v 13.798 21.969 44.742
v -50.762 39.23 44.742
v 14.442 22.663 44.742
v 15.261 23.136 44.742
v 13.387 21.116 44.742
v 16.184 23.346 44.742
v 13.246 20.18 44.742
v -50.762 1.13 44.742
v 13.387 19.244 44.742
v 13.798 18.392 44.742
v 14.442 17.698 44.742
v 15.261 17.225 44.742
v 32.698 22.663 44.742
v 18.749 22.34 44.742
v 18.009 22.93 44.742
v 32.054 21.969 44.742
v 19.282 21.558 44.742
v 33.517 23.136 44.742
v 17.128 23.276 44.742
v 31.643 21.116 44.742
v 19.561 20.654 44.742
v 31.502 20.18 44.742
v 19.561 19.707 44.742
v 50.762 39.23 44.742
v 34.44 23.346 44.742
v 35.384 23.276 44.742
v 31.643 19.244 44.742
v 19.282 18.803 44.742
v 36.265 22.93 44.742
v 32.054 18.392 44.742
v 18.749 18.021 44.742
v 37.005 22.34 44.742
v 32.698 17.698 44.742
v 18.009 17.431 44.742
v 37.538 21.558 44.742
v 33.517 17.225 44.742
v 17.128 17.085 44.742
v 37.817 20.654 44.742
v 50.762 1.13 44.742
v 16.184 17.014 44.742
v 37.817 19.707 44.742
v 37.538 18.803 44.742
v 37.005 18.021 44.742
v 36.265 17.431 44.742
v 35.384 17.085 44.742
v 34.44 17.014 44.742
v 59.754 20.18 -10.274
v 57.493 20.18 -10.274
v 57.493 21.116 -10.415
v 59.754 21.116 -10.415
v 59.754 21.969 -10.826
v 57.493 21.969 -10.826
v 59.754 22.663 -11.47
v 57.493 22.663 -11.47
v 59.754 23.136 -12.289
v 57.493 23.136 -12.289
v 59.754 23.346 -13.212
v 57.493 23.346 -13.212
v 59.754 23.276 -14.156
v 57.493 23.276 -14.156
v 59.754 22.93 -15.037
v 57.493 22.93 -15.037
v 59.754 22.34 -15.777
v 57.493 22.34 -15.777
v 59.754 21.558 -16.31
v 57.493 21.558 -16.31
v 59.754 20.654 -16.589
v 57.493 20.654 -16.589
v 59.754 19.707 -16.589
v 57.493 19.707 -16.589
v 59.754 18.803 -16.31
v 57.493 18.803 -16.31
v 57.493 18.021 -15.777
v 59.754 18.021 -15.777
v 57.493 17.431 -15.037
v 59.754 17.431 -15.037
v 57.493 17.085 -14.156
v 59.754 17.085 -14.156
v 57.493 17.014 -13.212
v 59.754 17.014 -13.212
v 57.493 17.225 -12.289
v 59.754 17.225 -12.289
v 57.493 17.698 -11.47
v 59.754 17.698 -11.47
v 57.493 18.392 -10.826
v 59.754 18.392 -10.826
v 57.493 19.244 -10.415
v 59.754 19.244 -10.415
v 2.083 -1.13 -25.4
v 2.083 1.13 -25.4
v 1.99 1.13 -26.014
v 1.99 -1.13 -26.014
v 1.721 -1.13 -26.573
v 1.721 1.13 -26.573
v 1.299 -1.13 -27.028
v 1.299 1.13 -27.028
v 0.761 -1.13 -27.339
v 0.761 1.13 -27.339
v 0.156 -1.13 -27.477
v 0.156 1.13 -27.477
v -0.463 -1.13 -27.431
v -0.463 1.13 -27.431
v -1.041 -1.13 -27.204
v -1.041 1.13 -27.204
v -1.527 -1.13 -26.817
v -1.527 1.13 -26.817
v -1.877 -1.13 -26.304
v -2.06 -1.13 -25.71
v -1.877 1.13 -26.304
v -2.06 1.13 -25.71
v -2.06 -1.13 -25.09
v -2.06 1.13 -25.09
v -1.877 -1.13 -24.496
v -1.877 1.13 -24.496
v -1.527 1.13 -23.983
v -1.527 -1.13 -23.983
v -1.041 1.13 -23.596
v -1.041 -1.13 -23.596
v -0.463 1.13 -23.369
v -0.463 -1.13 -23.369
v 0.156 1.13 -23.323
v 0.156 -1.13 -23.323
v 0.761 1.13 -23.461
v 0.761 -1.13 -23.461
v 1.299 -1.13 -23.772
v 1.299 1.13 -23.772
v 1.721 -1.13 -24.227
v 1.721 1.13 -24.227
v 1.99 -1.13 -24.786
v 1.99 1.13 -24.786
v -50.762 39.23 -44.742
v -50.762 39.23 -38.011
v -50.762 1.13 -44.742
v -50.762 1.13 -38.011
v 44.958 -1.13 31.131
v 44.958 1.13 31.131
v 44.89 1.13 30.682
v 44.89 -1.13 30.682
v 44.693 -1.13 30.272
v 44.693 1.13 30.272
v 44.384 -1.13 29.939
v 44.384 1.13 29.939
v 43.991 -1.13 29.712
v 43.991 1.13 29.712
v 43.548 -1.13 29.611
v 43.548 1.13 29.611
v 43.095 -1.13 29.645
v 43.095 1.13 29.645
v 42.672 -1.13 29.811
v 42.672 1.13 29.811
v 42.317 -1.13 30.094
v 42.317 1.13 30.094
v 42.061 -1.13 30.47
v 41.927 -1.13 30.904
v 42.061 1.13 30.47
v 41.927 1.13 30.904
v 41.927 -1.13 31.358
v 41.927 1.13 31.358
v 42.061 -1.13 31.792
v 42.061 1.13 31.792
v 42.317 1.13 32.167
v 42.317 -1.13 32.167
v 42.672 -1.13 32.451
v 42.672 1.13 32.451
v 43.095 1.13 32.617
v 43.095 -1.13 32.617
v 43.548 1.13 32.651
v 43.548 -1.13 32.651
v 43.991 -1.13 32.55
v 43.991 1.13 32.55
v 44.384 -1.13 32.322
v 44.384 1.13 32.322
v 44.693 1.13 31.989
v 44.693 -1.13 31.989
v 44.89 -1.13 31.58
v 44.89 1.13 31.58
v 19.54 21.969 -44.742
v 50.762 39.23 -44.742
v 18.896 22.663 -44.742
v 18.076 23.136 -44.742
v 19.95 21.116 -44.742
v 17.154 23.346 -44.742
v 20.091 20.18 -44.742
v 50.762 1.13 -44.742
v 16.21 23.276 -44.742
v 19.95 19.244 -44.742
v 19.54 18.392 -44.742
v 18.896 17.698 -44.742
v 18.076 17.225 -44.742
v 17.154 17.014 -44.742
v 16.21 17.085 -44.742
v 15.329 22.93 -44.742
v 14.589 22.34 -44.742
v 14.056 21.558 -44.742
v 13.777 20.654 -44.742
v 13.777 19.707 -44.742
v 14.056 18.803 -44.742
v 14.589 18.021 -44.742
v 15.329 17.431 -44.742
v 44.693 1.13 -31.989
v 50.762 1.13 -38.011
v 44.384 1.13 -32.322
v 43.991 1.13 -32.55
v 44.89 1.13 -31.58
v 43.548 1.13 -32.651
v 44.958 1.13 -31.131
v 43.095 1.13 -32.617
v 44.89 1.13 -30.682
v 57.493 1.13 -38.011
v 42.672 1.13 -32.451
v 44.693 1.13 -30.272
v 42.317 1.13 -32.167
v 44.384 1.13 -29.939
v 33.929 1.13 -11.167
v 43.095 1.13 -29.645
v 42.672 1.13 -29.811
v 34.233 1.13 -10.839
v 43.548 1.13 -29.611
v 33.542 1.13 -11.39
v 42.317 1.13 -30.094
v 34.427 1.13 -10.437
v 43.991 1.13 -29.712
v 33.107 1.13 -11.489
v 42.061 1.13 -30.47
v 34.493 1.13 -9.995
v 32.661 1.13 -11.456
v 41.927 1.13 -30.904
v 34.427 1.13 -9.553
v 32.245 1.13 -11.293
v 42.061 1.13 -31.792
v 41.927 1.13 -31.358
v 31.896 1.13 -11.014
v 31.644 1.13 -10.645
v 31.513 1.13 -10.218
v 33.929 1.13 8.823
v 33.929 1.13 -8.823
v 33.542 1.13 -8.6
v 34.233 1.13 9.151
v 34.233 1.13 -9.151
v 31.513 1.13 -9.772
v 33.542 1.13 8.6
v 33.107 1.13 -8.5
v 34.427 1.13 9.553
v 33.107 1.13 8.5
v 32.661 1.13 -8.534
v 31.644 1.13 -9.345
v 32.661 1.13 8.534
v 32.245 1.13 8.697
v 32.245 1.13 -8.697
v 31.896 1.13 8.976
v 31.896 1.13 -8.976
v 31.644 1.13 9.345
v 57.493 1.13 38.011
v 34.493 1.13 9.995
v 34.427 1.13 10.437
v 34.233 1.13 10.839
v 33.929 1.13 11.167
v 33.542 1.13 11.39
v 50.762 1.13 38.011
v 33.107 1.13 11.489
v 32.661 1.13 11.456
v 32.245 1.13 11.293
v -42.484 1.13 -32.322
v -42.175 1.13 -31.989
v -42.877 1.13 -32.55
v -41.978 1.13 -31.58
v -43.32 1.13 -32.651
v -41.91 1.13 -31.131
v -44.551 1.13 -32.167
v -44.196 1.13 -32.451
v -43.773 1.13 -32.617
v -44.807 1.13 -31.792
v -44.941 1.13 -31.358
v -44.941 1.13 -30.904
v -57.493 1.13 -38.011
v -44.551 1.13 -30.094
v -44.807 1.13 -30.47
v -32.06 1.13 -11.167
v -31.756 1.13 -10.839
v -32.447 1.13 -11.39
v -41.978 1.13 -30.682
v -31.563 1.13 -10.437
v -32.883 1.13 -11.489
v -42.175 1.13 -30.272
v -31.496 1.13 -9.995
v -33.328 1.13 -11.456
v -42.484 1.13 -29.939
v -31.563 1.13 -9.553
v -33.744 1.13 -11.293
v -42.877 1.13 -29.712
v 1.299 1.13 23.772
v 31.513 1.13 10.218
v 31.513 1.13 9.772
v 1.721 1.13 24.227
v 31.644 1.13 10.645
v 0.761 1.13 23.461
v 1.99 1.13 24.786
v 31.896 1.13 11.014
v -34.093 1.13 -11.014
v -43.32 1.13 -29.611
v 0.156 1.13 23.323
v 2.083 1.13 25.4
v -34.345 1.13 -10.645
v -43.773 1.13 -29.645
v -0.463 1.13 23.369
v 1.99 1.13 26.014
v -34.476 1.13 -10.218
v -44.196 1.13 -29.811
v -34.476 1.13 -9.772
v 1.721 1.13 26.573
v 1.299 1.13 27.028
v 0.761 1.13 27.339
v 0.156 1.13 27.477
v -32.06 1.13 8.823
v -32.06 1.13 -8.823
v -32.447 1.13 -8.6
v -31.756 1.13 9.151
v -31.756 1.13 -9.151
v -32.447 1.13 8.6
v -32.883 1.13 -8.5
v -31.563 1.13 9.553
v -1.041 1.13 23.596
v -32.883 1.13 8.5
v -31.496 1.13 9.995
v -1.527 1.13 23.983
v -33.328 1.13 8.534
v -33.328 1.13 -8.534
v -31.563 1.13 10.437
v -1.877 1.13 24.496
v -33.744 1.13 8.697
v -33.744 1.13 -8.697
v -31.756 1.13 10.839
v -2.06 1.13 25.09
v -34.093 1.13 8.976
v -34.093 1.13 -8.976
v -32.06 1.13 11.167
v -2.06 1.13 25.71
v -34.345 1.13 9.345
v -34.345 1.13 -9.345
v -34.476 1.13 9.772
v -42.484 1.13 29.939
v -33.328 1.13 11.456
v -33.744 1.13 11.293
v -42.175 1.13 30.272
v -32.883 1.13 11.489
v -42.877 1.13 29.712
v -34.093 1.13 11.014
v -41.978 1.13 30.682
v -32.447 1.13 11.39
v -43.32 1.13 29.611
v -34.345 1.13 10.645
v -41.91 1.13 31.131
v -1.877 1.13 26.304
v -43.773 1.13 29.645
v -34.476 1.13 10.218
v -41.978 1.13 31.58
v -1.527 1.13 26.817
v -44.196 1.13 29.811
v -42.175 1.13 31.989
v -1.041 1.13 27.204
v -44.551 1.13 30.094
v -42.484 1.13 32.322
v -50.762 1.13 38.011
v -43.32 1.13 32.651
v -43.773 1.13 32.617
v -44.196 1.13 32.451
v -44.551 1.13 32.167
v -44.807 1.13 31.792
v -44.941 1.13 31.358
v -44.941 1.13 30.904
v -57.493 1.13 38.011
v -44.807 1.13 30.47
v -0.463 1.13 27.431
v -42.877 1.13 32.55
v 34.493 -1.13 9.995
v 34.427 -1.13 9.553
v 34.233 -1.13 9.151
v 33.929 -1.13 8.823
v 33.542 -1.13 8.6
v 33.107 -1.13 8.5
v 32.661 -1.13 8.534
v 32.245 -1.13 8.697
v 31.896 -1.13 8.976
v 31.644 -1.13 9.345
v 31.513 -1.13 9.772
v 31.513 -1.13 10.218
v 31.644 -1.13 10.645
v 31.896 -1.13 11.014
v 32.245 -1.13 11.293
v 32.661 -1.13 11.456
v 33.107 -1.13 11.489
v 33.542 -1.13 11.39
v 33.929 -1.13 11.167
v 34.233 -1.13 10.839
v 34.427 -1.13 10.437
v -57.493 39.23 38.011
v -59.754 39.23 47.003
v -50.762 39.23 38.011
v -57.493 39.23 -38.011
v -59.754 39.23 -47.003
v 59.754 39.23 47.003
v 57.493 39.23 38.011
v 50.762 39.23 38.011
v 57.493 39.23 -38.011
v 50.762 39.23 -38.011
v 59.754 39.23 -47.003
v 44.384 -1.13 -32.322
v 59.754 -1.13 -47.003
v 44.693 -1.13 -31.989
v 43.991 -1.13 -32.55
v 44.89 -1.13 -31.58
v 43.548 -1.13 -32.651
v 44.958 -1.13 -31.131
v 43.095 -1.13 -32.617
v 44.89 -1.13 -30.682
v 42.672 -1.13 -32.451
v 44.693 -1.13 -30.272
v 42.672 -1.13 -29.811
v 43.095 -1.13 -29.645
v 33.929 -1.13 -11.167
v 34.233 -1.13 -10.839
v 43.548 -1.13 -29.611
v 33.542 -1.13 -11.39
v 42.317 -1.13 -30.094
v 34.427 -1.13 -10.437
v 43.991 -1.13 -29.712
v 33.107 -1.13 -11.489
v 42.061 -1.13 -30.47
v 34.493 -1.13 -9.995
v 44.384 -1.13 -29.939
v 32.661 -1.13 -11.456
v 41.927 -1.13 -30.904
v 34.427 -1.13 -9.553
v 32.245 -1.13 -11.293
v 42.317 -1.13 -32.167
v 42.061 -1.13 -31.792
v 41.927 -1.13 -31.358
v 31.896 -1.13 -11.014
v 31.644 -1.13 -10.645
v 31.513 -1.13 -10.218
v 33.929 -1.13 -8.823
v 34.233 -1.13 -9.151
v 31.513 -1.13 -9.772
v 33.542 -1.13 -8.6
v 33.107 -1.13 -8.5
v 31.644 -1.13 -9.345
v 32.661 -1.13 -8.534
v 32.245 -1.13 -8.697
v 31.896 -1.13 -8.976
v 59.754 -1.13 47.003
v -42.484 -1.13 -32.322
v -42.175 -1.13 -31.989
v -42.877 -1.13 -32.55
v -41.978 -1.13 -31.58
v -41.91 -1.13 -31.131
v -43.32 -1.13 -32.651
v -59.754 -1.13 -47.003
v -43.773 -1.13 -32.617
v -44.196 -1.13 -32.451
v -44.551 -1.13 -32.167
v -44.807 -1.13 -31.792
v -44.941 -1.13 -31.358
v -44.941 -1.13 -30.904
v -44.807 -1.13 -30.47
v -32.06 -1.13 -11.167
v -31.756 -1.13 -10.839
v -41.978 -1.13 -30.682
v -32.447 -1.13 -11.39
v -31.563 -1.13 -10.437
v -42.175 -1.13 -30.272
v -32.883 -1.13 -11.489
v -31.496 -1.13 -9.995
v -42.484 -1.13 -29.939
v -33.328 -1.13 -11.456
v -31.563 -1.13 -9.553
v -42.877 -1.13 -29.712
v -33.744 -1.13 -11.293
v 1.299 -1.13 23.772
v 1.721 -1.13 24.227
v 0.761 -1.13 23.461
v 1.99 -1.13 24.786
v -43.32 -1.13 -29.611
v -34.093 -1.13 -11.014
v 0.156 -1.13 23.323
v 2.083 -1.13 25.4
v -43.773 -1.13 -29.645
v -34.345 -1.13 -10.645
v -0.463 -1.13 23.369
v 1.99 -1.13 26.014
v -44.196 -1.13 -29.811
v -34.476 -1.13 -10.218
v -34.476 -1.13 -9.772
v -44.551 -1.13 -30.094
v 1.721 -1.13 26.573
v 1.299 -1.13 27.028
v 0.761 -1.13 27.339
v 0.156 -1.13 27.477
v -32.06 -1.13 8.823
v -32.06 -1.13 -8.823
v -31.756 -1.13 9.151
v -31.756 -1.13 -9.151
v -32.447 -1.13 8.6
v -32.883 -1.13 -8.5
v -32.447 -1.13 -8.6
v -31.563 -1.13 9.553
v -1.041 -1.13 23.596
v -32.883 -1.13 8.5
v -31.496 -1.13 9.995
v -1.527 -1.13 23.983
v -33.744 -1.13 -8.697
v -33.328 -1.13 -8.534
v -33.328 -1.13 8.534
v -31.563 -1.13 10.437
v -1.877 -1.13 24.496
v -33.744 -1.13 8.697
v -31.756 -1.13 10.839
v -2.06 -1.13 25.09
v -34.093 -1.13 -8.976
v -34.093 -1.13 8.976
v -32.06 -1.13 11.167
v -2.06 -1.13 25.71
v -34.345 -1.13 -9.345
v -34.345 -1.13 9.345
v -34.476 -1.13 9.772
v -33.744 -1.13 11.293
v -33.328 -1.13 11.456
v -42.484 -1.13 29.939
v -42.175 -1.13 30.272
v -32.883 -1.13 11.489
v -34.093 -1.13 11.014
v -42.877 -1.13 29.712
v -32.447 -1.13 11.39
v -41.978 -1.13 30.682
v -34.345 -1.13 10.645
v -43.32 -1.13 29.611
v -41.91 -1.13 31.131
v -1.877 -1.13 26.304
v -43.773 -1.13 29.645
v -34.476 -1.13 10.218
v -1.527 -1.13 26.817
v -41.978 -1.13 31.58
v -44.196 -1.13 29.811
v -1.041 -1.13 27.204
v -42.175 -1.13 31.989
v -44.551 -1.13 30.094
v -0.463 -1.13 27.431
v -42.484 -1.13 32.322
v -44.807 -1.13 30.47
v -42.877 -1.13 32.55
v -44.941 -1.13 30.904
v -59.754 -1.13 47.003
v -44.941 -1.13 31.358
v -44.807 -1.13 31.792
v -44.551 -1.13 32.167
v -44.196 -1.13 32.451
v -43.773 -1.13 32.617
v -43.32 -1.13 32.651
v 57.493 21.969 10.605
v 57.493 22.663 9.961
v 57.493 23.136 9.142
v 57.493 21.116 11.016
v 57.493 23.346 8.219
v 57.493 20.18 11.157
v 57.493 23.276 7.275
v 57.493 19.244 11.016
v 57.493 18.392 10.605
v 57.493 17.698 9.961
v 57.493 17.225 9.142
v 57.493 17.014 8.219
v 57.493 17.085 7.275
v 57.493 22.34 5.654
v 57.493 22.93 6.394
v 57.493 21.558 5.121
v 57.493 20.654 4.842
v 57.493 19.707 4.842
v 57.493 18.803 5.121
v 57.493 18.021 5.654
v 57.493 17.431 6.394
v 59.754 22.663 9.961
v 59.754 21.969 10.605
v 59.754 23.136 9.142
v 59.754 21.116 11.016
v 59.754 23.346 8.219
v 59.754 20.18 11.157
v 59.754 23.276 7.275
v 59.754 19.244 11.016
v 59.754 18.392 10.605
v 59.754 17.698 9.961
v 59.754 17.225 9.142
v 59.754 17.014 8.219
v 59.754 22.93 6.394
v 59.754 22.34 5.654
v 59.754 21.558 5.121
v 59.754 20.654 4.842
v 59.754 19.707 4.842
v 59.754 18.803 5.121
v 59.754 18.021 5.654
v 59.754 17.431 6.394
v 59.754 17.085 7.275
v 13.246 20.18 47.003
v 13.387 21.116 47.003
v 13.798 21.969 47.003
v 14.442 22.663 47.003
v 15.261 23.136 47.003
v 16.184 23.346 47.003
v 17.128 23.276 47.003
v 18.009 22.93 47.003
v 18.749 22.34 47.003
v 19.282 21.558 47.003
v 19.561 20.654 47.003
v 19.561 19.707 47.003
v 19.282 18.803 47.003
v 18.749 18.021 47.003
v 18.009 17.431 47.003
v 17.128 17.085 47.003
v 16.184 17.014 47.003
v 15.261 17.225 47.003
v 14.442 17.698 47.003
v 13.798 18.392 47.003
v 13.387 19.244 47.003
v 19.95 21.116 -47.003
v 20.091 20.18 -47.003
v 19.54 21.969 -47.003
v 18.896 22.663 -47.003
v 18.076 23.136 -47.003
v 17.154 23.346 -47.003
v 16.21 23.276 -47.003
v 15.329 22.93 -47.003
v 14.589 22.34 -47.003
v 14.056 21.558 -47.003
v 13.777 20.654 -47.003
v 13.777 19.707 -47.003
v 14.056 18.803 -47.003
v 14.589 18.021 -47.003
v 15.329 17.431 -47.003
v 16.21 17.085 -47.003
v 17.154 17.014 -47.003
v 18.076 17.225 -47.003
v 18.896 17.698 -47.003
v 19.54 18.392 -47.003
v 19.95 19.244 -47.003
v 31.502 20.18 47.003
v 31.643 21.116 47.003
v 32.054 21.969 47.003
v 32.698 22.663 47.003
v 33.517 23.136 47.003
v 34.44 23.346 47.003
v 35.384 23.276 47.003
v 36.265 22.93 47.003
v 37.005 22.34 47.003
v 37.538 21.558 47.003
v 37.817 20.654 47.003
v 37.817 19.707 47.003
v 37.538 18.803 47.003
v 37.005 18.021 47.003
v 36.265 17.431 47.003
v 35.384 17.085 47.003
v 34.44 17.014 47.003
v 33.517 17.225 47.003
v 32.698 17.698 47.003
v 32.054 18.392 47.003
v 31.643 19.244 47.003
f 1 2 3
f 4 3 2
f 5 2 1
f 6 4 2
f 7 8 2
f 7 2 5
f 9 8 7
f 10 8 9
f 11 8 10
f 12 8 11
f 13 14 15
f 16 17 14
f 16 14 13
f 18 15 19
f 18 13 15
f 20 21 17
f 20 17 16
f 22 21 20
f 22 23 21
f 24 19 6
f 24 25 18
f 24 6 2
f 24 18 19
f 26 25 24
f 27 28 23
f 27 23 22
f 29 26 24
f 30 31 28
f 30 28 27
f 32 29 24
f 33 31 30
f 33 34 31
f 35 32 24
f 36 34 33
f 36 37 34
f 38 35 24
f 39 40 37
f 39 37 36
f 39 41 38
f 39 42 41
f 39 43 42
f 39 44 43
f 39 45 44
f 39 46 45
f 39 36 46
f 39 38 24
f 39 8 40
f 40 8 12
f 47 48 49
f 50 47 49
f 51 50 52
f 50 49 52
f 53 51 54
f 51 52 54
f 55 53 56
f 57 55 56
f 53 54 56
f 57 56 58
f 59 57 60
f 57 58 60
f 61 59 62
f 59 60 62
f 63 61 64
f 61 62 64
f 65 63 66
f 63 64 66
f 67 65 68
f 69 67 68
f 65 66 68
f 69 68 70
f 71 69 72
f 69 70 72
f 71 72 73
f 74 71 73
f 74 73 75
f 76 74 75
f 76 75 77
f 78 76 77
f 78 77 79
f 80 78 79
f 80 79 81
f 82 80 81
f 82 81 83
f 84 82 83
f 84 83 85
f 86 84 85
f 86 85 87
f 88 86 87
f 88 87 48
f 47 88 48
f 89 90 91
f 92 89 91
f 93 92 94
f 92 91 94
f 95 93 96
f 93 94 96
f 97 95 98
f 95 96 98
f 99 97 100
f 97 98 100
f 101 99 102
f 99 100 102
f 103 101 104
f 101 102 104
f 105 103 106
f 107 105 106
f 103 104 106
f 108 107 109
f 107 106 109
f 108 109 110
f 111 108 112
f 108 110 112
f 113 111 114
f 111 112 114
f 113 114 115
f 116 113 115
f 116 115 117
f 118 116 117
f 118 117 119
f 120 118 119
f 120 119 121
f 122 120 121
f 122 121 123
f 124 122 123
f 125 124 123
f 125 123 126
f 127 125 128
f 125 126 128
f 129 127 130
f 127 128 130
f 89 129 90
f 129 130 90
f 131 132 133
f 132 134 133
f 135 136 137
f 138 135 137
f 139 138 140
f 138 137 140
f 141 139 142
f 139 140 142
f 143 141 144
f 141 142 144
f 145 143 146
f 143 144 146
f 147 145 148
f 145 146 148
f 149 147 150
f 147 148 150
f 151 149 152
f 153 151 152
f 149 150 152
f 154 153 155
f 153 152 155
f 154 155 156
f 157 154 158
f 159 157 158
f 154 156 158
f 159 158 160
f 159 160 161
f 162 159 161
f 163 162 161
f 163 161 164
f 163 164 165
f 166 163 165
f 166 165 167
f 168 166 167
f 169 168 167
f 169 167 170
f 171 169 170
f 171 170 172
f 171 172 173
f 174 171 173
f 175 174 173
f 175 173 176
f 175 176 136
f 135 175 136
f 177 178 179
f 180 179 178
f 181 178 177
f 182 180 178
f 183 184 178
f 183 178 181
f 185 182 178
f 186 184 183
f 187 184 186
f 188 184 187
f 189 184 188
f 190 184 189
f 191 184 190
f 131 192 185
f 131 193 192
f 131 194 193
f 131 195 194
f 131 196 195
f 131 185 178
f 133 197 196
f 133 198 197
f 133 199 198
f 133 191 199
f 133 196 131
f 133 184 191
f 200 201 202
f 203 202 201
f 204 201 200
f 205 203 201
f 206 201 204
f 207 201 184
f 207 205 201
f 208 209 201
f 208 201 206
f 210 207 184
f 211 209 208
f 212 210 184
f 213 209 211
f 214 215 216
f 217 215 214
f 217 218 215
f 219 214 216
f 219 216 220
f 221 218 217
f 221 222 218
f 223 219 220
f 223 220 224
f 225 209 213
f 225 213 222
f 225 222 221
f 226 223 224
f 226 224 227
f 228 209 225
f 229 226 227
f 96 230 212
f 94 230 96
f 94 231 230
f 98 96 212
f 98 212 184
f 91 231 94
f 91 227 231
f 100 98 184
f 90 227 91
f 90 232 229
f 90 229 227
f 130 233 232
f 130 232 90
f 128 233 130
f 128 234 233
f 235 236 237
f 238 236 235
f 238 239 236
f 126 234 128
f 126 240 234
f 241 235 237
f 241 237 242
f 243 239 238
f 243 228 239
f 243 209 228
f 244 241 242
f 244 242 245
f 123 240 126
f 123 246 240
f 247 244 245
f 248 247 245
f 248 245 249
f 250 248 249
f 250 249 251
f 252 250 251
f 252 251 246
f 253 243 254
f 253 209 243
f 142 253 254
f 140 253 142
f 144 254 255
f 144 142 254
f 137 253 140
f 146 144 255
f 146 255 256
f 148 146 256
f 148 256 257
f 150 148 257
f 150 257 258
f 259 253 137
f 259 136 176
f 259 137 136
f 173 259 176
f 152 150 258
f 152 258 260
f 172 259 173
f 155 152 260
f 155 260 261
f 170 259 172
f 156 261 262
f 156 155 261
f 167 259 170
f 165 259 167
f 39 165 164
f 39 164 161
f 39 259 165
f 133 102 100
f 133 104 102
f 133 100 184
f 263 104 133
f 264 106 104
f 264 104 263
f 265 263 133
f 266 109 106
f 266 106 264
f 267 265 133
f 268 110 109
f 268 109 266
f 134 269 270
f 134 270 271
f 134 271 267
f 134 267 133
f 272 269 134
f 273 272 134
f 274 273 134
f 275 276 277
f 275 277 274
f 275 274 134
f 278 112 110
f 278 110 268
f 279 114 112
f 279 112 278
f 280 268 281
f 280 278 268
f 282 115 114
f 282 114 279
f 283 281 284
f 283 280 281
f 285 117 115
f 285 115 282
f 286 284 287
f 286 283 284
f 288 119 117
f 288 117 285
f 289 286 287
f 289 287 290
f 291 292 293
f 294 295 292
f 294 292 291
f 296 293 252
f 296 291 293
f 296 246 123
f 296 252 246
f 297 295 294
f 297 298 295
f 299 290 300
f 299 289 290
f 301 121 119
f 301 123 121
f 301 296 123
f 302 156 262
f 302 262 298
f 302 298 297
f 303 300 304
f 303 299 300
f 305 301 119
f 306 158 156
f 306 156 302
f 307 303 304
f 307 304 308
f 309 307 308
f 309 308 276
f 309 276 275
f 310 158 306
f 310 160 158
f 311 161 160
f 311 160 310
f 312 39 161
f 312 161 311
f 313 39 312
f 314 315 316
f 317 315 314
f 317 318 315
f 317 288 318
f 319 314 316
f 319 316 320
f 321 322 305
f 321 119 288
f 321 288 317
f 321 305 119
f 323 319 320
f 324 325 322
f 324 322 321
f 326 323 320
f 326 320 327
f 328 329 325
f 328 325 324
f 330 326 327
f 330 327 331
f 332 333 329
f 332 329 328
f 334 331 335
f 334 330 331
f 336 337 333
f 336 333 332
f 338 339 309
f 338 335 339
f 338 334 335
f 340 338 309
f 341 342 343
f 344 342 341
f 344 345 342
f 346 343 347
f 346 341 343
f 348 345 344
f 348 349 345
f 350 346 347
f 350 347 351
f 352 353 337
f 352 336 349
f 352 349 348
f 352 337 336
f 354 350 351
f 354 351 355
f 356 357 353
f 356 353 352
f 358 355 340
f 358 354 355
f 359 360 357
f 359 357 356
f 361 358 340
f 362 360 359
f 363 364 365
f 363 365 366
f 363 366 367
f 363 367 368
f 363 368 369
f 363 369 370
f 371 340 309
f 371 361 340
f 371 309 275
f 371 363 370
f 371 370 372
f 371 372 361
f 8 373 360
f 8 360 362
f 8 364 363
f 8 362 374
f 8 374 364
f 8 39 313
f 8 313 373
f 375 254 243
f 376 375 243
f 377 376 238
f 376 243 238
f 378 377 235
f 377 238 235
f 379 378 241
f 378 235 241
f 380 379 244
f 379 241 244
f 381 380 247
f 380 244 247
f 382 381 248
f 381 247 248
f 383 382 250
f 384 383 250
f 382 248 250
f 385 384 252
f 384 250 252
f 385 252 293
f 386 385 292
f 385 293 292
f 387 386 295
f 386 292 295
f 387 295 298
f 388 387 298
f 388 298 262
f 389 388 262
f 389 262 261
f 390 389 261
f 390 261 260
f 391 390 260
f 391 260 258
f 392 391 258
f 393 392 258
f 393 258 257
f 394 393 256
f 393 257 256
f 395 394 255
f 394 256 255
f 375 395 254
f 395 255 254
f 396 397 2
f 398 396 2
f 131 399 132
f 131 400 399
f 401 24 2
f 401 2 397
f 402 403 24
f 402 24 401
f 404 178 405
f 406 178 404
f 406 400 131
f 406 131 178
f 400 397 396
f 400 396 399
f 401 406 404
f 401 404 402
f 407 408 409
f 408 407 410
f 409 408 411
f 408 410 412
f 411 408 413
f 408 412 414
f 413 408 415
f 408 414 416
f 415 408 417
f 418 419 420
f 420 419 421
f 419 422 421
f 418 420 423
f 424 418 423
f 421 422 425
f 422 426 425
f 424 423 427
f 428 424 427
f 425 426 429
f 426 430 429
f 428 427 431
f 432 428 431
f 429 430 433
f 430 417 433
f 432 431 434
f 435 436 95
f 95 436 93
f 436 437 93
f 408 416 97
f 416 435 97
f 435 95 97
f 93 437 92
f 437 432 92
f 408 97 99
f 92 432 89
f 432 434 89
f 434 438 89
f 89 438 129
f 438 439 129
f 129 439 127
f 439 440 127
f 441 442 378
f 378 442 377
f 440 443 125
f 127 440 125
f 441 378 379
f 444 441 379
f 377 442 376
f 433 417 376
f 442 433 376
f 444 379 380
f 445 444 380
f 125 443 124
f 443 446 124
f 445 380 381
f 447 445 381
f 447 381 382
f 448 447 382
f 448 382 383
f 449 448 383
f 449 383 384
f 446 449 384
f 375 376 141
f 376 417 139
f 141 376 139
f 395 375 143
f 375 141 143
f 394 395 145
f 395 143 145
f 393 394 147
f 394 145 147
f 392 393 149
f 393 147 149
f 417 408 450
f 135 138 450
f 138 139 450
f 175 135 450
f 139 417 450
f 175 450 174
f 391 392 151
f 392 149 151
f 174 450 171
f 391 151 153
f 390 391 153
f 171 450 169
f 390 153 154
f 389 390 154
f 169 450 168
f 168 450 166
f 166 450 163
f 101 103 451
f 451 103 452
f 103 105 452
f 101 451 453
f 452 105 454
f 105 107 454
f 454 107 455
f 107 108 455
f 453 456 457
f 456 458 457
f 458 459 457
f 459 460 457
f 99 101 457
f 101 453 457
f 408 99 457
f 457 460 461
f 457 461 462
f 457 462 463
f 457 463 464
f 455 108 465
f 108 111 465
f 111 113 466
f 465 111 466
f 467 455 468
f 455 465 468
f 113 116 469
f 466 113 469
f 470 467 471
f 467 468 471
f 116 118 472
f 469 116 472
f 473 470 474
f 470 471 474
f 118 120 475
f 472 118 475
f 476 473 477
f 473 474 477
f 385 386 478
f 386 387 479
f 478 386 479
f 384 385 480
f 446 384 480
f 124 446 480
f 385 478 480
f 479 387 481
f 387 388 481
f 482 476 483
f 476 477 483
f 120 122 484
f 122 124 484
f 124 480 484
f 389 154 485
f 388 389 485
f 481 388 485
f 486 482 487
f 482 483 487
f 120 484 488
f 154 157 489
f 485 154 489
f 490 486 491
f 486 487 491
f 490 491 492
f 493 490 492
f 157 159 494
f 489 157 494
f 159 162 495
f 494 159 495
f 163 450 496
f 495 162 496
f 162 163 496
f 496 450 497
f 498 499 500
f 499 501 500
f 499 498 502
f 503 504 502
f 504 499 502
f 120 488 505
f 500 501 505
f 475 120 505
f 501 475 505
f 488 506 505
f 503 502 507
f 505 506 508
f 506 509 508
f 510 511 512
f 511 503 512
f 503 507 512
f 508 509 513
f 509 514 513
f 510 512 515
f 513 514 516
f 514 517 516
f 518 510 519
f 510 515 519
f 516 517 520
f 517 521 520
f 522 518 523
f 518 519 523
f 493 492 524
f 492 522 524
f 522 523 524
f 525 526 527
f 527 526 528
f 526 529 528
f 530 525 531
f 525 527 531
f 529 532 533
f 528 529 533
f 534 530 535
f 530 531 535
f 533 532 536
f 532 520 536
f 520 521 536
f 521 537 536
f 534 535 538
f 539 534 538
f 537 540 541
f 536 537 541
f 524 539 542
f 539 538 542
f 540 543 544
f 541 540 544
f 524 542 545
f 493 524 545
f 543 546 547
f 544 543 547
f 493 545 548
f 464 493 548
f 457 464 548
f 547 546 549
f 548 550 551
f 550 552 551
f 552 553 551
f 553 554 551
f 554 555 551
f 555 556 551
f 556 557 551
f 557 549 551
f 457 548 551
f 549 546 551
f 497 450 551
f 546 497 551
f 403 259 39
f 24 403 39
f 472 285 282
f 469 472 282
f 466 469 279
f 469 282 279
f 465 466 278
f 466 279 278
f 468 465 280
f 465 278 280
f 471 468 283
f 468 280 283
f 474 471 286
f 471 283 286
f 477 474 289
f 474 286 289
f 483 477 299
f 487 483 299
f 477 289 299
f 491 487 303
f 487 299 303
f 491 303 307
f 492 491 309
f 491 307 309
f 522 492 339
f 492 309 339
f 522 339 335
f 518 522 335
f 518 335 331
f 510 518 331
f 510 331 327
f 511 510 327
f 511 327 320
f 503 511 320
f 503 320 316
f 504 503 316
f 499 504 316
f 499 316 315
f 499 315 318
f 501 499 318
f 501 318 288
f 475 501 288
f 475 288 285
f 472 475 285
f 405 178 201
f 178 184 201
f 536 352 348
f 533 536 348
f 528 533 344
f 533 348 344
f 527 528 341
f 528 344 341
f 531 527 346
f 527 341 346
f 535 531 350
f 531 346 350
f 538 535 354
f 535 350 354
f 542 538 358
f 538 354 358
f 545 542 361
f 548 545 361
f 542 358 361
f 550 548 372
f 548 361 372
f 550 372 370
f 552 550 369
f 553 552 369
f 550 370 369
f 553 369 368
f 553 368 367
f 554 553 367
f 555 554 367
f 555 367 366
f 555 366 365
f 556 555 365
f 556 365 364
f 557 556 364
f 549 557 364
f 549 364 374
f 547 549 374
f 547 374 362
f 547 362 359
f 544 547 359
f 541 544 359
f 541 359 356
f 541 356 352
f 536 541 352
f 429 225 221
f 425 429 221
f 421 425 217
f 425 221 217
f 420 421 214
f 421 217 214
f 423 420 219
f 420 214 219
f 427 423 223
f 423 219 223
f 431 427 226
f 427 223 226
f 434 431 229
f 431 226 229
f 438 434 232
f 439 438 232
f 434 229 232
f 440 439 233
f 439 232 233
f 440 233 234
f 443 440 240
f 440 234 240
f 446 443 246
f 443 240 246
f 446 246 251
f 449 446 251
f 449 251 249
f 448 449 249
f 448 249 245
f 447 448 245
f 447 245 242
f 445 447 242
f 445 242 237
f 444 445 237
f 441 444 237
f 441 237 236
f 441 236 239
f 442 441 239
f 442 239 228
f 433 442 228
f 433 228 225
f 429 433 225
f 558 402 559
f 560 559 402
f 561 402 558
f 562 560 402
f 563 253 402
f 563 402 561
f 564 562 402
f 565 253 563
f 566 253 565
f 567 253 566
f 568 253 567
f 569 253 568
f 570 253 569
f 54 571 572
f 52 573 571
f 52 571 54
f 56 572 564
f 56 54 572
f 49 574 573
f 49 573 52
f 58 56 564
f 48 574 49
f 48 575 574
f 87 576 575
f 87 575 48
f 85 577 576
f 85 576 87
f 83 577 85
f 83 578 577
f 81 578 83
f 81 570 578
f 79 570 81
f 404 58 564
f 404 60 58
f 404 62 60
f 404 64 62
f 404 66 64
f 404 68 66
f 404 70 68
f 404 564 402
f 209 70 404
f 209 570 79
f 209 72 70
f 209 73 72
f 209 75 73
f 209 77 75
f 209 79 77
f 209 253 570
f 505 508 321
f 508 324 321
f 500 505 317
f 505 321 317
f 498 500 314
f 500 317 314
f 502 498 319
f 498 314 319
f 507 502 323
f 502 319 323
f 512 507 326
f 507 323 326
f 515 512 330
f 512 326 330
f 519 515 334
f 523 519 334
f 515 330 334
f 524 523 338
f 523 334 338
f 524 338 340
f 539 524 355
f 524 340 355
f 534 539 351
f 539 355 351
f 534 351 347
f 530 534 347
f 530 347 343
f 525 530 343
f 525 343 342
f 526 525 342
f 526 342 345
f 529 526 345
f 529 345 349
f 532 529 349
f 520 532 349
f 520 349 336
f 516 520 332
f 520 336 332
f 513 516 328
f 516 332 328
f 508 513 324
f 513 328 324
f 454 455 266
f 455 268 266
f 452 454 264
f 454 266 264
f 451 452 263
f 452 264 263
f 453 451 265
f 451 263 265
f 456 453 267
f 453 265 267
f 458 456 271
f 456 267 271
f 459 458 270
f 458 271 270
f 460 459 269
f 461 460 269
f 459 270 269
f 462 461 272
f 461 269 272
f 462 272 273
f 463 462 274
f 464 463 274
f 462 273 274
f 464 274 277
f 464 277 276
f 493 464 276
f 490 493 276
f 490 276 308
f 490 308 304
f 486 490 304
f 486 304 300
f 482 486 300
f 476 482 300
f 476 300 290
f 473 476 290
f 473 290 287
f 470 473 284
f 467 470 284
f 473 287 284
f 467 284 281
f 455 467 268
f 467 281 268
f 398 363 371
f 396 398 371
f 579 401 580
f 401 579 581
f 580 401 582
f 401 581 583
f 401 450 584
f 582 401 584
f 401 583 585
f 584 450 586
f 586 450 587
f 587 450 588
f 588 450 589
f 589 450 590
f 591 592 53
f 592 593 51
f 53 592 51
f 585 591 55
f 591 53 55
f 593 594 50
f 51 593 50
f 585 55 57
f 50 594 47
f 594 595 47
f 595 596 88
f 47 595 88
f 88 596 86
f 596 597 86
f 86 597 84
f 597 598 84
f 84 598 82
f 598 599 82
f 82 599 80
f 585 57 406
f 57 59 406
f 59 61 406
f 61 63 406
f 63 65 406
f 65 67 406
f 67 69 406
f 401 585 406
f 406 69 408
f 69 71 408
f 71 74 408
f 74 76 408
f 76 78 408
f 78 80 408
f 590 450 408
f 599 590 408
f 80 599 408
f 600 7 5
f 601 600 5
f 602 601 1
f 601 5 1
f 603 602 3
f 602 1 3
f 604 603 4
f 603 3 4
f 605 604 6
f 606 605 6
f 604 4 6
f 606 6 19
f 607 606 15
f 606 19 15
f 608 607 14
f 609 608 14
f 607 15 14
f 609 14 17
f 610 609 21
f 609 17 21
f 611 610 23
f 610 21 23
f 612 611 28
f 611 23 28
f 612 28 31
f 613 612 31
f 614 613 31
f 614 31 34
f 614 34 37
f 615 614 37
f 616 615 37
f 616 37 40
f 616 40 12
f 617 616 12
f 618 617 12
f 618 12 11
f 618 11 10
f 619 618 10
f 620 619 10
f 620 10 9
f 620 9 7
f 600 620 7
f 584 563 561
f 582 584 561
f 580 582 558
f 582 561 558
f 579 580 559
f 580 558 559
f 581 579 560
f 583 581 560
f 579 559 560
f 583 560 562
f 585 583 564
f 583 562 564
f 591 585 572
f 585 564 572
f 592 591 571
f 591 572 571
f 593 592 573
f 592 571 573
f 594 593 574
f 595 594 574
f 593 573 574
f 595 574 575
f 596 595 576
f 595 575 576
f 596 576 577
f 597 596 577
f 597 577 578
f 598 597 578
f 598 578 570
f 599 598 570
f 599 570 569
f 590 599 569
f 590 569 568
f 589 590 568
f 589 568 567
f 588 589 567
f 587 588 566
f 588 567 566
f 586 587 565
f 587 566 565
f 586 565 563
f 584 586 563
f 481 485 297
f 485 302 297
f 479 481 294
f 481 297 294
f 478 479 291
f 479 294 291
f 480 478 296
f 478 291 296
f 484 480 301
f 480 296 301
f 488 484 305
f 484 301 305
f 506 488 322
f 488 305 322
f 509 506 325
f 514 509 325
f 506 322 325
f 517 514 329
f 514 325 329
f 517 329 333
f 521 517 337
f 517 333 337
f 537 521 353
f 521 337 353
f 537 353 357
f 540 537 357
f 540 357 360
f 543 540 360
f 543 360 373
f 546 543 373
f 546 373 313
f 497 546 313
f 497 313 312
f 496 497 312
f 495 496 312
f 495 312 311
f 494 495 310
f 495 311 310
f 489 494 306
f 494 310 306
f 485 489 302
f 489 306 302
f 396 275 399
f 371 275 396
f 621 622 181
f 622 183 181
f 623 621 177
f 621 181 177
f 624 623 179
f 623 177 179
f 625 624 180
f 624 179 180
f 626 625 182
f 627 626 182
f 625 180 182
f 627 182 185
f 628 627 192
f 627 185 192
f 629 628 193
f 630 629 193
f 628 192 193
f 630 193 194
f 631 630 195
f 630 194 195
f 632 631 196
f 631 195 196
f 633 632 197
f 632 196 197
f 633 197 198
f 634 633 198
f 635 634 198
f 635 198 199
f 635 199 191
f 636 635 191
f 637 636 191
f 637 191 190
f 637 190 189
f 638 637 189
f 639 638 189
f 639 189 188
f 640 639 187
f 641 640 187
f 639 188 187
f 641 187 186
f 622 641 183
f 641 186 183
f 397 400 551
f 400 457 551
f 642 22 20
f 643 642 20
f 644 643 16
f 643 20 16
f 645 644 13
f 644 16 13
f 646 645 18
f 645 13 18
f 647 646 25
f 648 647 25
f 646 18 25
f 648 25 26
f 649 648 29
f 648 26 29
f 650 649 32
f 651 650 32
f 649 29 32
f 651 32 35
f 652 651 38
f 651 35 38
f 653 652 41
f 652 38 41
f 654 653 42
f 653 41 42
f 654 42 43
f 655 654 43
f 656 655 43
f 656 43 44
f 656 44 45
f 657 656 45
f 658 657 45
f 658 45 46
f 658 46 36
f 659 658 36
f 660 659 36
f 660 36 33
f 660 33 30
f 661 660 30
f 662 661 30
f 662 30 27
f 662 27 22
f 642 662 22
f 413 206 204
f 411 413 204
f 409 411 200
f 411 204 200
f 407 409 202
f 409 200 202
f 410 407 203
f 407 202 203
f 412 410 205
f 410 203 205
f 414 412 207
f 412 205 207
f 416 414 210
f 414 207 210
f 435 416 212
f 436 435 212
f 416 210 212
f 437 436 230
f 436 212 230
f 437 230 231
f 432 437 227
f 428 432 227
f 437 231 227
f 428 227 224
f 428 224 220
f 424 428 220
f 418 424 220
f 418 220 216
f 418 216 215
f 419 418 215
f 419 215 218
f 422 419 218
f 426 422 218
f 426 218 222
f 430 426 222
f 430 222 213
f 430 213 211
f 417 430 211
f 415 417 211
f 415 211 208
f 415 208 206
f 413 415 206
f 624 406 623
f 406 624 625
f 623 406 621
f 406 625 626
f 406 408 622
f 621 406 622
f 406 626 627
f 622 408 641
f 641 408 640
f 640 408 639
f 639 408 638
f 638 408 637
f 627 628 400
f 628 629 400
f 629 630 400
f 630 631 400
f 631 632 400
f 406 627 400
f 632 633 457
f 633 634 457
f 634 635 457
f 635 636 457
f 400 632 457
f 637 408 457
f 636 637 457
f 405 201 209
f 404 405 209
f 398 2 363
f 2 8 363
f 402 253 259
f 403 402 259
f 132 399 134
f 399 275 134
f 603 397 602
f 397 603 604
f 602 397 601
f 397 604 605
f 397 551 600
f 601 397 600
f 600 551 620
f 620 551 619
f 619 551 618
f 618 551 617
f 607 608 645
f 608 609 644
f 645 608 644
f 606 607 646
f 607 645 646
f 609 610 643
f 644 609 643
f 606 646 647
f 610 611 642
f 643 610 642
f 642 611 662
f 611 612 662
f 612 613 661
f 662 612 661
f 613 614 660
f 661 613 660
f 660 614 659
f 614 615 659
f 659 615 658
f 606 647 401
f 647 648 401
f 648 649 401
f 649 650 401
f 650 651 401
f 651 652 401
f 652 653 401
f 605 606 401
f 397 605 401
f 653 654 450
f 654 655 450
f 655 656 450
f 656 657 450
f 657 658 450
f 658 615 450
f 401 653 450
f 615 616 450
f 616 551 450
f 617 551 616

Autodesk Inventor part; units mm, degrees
ref_plane "YZ Plane" through (0, 0, 0) normal (1, 0, 0) x (0, 1, 0)
ref_plane "XZ Plane" through (0, 0, 0) normal (0, 1, 0) x (-1, 0, 0)
ref_plane "XY Plane" through (0, 0, 0) normal (0, 0, 1) x (1, 0, 0)
sketch "Sketch1" plane through (0, 0, 0) normal (0, 1, 0) x (-1, 0, 0)
  line L0 (-59.7535, -47.0027) -> (59.7535, -47.0027)
  line L1 (59.7535, -47.0027) -> (59.7535, 47.0027)
  line L2 (59.7535, 47.0027) -> (-59.7535, 47.0027)
  line L3 (-59.7535, 47.0027) -> (-59.7535, -47.0027)
  line L4 (-59.7535, -47.0027) -> (59.7535, 47.0027) construction
  line L5 (59.7535, -47.0027) -> (-59.7535, 47.0027) construction
  point P0 (0, 0)
  dimension "d0" = 119.507
  dimension "d1" = 94.0054
extrude "Extrusion1" add sketch "Sketch1" along normal mid plane 2.2606
sketch "Sketch2" plane through (0, 1.1303, 0) normal (0, 1, 0) x (1, 0, 0)
  line L0 (-59.7535, 47.0027) -> (-59.7535, -47.0027) projected
  line L1 (59.7535, -47.0027) -> (59.7535, 47.0027) projected
  line L2 (-59.7535, -47.0027) -> (59.7535, -47.0027)
  line L3 (59.7535, -47.0027) -> (59.7535, 47.0027)
  line L4 (59.7535, 47.0027) -> (-59.7535, 47.0027)
  line L5 (-59.7535, 47.0027) -> (-59.7535, -47.0027)
  line L6 (57.4929, -44.7421) -> (-57.4929, 44.7421) construction
  line L7 (-57.4929, -44.7421) -> (57.4929, 44.7421) construction
  line L8 (-59.7535, -47.0027) -> (59.7535, -47.0027) projected
  line L9 (-59.7535, -47.0027) -> (-50.7619, -47.0027)
  line L10 (-59.7535, -38.0111) -> (-59.7535, -47.0027)
  line L11 (-59.7535, 47.0027) -> (-50.7619, 47.0027)
  line L12 (-59.7535, 38.0111) -> (-59.7535, 47.0027)
  line L13 (59.7535, 47.0027) -> (-59.7535, 47.0027) projected
  line L14 (59.7535, 47.0027) -> (50.7619, 47.0027)
  line L15 (59.7535, 38.0111) -> (59.7535, 47.0027)
  line L16 (59.7535, -47.0027) -> (50.7619, -47.0027)
  line L17 (59.7535, -38.0111) -> (59.7535, -47.0027)
  line L18 (-50.7619, -44.7421) -> (-50.7619, -38.0111)
  line L19 (-50.7619, -38.0111) -> (-57.4929, -38.0111)
  line L20 (-57.4929, 38.0111) -> (-50.7619, 38.0111)
  line L21 (-50.7619, 38.0111) -> (-50.7619, 44.7421)
  line L22 (50.7619, 38.0111) -> (57.4929, 38.0111)
  line L23 (50.7619, 44.7421) -> (50.7619, 38.0111)
  line L24 (57.4929, -38.0111) -> (50.7619, -38.0111)
  line L25 (50.7619, -38.0111) -> (50.7619, -44.7421)
  line L26 (-50.7619, -44.7421) -> (50.7619, -44.7421)
  line L27 (57.4929, -38.0111) -> (57.4929, 38.0111)
  line L28 (50.7619, 44.7421) -> (-50.7619, 44.7421)
  line L29 (-57.4929, 38.0111) -> (-57.4929, -38.0111)
  point P0 (0, 0)
  dimension "d4" = 114.9858
  dimension "d5" = 89.4842
  dimension "d6" = 8.9916
  dimension "d7" = 8.9916
  dimension "d10" = 8.9916
  dimension "d11" = 8.9916
extrude "Extrusion2" add sketch "Sketch2" along normal blind 38.1
sketch "Sketch3" plane through (0, 1.1303, 0) normal (0, 1, 0) x (1, 0, 0)
  circle A0 centre (0, -25.4) radius 2.0828
  circle A1 centre (0, 25.4) radius 2.0828
  point P0 (0, 0)
  dimension "d18" = 4.1656
  dimension "d19" = 4.1656
extrude "Extrusion3" cut sketch "Sketch3" against normal through all
sketch "Sketch7" plane through (0, 1.1303, 0) normal (0, 1, 0) x (1, 0, 0)
  line L0 (44.9961, -32.4993) -> (-44.9961, 32.4993) construction
  line L1 (-44.9961, -32.4993) -> (44.9961, 32.4993) construction
  line L2 (-44.9961, -32.4993) -> (-38.6461, -32.4993) construction
  line L3 (44.9961, -32.4993) -> (64.0461, -32.4993) construction
  line L4 (32.9946, -9.9949) -> (-32.9946, 9.9949) construction
  line L5 (-32.9946, -9.9949) -> (32.9946, 9.9949) construction
  circle A0 centre (-32.9946, -9.9949) radius 1.4986
  circle A1 centre (-32.9946, 9.9949) radius 1.4986
  circle A2 centre (32.9946, -9.9949) radius 1.4986
  circle A3 centre (32.9946, 9.9949) radius 1.4986
  line L6 (-44.45, -32.1469) -> (44.45, -32.1469)
  line L7 (44.45, 32.1469) -> (-44.45, 32.1469)
  line L8 (-44.45, 32.1469) -> (-44.45, -32.1469)
  line L9 (-44.45, -32.1469) -> (44.45, 32.1469) construction
  line L10 (44.45, -32.1469) -> (-44.45, 32.1469) construction
  line L11 (-44.45, -32.1469) -> (-43.434, -32.1469)
  line L12 (-44.45, -31.1309) -> (-44.45, -32.1469)
  circle A4 centre (-43.434, -31.1309) radius 1.524
  line L13 (-44.45, 32.1469) -> (-43.434, 32.1469)
  line L14 (-44.45, 31.1309) -> (-44.45, 32.1469)
  circle A5 centre (-43.434, 31.1309) radius 1.524
  line L15 (44.45, 32.1469) -> (43.434, 32.1469)
  line L16 (44.45, 31.1309) -> (44.45, 32.1469)
  circle A6 centre (43.434, 31.1309) radius 1.524
  line L17 (44.45, -32.1469) -> (43.434, -32.1469)
  line L18 (43.434, -31.1309) -> (44.45, -31.1309)
  circle A7 centre (43.434, -31.1309) radius 1.524
  point P0 (0, 0)
  dimension "d47" = 89.9922
  dimension "d48" = 64.9986
  dimension "d62" = 65.9892
  dimension "d63" = 19.9898
  dimension "d64" = 2.9972
  dimension "d65" = 2.9972
  dimension "d66" = 2.9972
  dimension "d67" = 2.9972
  dimension "d120" = 88.9
  dimension "d121" = 64.2938
  dimension "d124" = 3.048
  dimension "d127" = 3.048
  dimension "d130" = 3.048
  dimension "d131" = 1.016
  dimension "d132" = 1.016
  dimension "d133" = 3.048
sketch "Sketch8" plane through (-50.7619, 1.1303, -44.7421) normal (0, 0, 1) x (1, 0, 0)
  line L0 (0, 0) -> (0, 38.1) projected
  circle A0 centre (67.6783, 19.05) radius 3.175
  point P0 (50.7619, -1.1303)
  dimension "d99" = 6.35
extrude "Extrusion7" cut sketch "Sketch8" against normal through all
sketch "Sketch10" plane through (57.4929, 1.1303, -38.0111) normal (-1, 0, 0) x (0, 0, 1)
  line L0 (0, 0) -> (0, 38.1) projected
  line L1 (0, 19.05) -> (5.5118, 19.05) construction
  circle A0 centre (24.5618, 19.05) radius 3.175
  circle A1 centre (45.993, 19.05) radius 3.175
  point P0 (38.0111, -1.1303)
  dimension "d118" = 6.35
  dimension "d119" = 6.35
extrude "Extrusion8" cut sketch "Sketch10" against normal through all
sketch "Sketch11" plane through (50.7619, 1.1303, 44.7421) normal (0, 0, -1) x (-1, 0, 0)
  line L0 (101.5238, 0) -> (101.5238, 38.1) projected
  line L1 (101.5238, 19.05) -> (95.758, 19.05)
  line L2 (0, 0) -> (0, 38.1) projected
  line L3 (0, 0) -> (0, 38.1) projected
  circle A0 centre (16.0846, 19.05) radius 3.175
  circle A1 centre (34.3408, 19.05) radius 3.175
  point P0 (50.7619, -1.1303)
  dimension "d80" = 5.7658
  dimension "d112" = 6.35
  dimension "d113" = 6.35
extrude "Extrusion9" cut sketch "Sketch11" against normal through all
extrude "Extrusion10" cut sketch "Sketch7" against normal through all
properties part number "546-1590BBS-ADF41020"
